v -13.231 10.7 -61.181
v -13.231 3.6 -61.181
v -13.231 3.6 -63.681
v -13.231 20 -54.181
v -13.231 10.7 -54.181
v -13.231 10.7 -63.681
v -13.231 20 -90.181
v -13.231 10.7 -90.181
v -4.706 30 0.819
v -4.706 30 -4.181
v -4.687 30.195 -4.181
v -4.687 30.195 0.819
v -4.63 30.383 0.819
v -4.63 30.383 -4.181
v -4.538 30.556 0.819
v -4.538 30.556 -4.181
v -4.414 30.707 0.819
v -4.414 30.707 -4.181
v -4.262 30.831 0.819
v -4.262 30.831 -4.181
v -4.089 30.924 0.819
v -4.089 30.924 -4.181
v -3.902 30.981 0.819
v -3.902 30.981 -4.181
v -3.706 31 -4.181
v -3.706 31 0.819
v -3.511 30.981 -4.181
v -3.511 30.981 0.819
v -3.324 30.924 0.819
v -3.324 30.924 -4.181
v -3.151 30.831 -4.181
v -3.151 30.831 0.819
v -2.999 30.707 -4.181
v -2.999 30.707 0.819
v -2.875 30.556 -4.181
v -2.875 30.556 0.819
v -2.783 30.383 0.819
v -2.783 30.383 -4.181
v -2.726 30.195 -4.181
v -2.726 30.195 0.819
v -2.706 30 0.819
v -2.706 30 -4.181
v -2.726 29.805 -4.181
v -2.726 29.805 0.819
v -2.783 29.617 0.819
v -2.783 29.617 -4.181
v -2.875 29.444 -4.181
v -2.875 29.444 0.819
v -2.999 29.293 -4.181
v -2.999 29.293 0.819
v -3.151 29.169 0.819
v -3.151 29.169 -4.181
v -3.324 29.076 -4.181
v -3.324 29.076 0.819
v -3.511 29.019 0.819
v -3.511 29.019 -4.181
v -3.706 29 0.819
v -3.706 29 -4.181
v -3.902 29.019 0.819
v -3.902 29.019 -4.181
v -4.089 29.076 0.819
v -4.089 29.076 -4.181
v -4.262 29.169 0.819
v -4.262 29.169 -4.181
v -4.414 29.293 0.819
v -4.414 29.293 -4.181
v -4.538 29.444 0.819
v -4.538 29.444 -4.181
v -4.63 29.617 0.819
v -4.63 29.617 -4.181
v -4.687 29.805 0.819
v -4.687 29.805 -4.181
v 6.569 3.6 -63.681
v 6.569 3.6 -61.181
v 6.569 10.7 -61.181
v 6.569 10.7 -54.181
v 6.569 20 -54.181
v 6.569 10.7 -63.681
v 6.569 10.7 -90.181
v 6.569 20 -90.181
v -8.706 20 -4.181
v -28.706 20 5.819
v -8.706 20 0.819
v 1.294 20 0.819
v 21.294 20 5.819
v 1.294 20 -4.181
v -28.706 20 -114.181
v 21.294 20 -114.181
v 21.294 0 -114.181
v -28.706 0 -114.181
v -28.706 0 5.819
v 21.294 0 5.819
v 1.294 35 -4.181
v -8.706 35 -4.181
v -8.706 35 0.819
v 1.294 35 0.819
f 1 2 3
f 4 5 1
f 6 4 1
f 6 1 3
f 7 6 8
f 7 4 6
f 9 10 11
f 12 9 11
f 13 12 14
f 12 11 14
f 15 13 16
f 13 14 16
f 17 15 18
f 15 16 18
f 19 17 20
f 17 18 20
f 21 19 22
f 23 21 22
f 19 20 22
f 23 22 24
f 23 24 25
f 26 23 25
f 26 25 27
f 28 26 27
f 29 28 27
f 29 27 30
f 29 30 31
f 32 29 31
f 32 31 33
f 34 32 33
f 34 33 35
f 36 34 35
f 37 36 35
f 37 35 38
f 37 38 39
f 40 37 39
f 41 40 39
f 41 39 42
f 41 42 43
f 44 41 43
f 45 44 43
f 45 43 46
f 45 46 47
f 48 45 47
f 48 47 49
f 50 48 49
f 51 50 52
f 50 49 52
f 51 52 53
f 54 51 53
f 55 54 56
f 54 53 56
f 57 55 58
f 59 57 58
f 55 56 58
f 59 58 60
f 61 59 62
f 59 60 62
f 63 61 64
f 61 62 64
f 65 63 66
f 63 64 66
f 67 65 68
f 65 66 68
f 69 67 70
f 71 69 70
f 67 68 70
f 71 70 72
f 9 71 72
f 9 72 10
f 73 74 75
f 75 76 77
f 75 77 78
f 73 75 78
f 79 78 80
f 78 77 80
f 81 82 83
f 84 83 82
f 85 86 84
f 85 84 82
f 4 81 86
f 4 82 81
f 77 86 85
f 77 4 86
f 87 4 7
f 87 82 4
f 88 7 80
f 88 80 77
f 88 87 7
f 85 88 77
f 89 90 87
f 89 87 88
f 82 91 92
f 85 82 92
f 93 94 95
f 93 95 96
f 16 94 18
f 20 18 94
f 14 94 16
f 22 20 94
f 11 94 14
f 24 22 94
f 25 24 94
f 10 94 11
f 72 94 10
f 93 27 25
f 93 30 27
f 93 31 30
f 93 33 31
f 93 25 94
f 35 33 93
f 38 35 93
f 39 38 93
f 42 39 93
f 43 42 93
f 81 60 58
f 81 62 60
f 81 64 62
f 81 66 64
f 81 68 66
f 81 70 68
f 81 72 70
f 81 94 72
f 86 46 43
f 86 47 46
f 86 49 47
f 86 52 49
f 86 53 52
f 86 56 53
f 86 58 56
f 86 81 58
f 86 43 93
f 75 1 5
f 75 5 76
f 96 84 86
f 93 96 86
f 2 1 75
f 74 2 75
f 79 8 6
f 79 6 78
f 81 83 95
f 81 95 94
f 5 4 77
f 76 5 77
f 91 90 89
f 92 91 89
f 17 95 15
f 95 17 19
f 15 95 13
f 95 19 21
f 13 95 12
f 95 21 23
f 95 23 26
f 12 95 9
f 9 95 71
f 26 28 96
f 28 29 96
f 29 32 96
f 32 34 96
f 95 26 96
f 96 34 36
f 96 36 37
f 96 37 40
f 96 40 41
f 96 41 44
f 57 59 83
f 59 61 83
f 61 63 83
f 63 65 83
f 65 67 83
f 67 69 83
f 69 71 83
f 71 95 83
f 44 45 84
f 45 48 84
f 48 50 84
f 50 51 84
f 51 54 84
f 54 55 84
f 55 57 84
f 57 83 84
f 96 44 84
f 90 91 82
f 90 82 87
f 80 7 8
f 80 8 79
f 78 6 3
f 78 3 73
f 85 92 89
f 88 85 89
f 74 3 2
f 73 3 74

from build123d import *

# Parameters (mm, degrees)
SKETCH1_W           = 50
SKETCH1_H           = 120
BOSS_EXTRUDE1_DEPTH = 20
SKETCH11_W          = 10
SKETCH11_H          = 5
BOSS_EXTRUDE5_DEPTH = 15
SKETCH13_R          = 1
CUT_EXTRUDE3_DEPTH  = 10
SKETCH14_W          = 19.8
SKETCH14_H          = 36
CUT_EXTRUDE4_DEPTH  = 9.3
SKETCH15_W          = 19.8
SKETCH15_H          = 2.5
CUT_EXTRUDE5_DEPTH  = 7.1


with BuildPart() as part:
    # Sketch1 → Boss-Extrude1 (new body)
    with BuildSketch(Plane(origin=(0, 0, 0), x_dir=(1, 0, 0), z_dir=(0, 1, 0))):
        with Locations((-3.706441645, 54.181126694)):
            Rectangle(SKETCH1_W, SKETCH1_H)
    extrude(amount=BOSS_EXTRUDE1_DEPTH)

    # Sketch11 → Boss-Extrude5 (add)
    with BuildSketch(Plane(origin=(0, 20, 0), x_dir=(1, 0, 0), z_dir=(0, 1, 0))):
        with Locations((-3.706441645, 1.681126694)):
            Rectangle(SKETCH11_W, SKETCH11_H)
    extrude(amount=BOSS_EXTRUDE5_DEPTH)

    # Sketch13 → Cut-Extrude3 (cut)
    with BuildSketch(Plane(origin=(0, 0, -4.181126694), x_dir=(-1, 0, 0), z_dir=(0, 0, -1))):
        with Locations((3.706441645, 30)):
            Circle(SKETCH13_R)
    extrude(amount=-CUT_EXTRUDE3_DEPTH, mode=Mode.SUBTRACT)

    # Sketch14 → Cut-Extrude4 (cut)
    with BuildSketch(Plane(origin=(0, 20, 0), x_dir=(1, 0, 0), z_dir=(0, 1, 0))):
        with Locations((-3.331441645, 72.181126694)):
            Rectangle(SKETCH14_W, SKETCH14_H)
    extrude(amount=-CUT_EXTRUDE4_DEPTH, mode=Mode.SUBTRACT)

    # Sketch15 → Cut-Extrude5 (cut)
    with BuildSketch(Plane(origin=(0, 10.7, 0), x_dir=(1, 0, 0), z_dir=(0, 1, 0))):
        with Locations((-3.331441645, 62.431126694)):
            Rectangle(SKETCH15_W, SKETCH15_H)
    extrude(amount=-CUT_EXTRUDE5_DEPTH, mode=Mode.SUBTRACT)


solid = part.part
